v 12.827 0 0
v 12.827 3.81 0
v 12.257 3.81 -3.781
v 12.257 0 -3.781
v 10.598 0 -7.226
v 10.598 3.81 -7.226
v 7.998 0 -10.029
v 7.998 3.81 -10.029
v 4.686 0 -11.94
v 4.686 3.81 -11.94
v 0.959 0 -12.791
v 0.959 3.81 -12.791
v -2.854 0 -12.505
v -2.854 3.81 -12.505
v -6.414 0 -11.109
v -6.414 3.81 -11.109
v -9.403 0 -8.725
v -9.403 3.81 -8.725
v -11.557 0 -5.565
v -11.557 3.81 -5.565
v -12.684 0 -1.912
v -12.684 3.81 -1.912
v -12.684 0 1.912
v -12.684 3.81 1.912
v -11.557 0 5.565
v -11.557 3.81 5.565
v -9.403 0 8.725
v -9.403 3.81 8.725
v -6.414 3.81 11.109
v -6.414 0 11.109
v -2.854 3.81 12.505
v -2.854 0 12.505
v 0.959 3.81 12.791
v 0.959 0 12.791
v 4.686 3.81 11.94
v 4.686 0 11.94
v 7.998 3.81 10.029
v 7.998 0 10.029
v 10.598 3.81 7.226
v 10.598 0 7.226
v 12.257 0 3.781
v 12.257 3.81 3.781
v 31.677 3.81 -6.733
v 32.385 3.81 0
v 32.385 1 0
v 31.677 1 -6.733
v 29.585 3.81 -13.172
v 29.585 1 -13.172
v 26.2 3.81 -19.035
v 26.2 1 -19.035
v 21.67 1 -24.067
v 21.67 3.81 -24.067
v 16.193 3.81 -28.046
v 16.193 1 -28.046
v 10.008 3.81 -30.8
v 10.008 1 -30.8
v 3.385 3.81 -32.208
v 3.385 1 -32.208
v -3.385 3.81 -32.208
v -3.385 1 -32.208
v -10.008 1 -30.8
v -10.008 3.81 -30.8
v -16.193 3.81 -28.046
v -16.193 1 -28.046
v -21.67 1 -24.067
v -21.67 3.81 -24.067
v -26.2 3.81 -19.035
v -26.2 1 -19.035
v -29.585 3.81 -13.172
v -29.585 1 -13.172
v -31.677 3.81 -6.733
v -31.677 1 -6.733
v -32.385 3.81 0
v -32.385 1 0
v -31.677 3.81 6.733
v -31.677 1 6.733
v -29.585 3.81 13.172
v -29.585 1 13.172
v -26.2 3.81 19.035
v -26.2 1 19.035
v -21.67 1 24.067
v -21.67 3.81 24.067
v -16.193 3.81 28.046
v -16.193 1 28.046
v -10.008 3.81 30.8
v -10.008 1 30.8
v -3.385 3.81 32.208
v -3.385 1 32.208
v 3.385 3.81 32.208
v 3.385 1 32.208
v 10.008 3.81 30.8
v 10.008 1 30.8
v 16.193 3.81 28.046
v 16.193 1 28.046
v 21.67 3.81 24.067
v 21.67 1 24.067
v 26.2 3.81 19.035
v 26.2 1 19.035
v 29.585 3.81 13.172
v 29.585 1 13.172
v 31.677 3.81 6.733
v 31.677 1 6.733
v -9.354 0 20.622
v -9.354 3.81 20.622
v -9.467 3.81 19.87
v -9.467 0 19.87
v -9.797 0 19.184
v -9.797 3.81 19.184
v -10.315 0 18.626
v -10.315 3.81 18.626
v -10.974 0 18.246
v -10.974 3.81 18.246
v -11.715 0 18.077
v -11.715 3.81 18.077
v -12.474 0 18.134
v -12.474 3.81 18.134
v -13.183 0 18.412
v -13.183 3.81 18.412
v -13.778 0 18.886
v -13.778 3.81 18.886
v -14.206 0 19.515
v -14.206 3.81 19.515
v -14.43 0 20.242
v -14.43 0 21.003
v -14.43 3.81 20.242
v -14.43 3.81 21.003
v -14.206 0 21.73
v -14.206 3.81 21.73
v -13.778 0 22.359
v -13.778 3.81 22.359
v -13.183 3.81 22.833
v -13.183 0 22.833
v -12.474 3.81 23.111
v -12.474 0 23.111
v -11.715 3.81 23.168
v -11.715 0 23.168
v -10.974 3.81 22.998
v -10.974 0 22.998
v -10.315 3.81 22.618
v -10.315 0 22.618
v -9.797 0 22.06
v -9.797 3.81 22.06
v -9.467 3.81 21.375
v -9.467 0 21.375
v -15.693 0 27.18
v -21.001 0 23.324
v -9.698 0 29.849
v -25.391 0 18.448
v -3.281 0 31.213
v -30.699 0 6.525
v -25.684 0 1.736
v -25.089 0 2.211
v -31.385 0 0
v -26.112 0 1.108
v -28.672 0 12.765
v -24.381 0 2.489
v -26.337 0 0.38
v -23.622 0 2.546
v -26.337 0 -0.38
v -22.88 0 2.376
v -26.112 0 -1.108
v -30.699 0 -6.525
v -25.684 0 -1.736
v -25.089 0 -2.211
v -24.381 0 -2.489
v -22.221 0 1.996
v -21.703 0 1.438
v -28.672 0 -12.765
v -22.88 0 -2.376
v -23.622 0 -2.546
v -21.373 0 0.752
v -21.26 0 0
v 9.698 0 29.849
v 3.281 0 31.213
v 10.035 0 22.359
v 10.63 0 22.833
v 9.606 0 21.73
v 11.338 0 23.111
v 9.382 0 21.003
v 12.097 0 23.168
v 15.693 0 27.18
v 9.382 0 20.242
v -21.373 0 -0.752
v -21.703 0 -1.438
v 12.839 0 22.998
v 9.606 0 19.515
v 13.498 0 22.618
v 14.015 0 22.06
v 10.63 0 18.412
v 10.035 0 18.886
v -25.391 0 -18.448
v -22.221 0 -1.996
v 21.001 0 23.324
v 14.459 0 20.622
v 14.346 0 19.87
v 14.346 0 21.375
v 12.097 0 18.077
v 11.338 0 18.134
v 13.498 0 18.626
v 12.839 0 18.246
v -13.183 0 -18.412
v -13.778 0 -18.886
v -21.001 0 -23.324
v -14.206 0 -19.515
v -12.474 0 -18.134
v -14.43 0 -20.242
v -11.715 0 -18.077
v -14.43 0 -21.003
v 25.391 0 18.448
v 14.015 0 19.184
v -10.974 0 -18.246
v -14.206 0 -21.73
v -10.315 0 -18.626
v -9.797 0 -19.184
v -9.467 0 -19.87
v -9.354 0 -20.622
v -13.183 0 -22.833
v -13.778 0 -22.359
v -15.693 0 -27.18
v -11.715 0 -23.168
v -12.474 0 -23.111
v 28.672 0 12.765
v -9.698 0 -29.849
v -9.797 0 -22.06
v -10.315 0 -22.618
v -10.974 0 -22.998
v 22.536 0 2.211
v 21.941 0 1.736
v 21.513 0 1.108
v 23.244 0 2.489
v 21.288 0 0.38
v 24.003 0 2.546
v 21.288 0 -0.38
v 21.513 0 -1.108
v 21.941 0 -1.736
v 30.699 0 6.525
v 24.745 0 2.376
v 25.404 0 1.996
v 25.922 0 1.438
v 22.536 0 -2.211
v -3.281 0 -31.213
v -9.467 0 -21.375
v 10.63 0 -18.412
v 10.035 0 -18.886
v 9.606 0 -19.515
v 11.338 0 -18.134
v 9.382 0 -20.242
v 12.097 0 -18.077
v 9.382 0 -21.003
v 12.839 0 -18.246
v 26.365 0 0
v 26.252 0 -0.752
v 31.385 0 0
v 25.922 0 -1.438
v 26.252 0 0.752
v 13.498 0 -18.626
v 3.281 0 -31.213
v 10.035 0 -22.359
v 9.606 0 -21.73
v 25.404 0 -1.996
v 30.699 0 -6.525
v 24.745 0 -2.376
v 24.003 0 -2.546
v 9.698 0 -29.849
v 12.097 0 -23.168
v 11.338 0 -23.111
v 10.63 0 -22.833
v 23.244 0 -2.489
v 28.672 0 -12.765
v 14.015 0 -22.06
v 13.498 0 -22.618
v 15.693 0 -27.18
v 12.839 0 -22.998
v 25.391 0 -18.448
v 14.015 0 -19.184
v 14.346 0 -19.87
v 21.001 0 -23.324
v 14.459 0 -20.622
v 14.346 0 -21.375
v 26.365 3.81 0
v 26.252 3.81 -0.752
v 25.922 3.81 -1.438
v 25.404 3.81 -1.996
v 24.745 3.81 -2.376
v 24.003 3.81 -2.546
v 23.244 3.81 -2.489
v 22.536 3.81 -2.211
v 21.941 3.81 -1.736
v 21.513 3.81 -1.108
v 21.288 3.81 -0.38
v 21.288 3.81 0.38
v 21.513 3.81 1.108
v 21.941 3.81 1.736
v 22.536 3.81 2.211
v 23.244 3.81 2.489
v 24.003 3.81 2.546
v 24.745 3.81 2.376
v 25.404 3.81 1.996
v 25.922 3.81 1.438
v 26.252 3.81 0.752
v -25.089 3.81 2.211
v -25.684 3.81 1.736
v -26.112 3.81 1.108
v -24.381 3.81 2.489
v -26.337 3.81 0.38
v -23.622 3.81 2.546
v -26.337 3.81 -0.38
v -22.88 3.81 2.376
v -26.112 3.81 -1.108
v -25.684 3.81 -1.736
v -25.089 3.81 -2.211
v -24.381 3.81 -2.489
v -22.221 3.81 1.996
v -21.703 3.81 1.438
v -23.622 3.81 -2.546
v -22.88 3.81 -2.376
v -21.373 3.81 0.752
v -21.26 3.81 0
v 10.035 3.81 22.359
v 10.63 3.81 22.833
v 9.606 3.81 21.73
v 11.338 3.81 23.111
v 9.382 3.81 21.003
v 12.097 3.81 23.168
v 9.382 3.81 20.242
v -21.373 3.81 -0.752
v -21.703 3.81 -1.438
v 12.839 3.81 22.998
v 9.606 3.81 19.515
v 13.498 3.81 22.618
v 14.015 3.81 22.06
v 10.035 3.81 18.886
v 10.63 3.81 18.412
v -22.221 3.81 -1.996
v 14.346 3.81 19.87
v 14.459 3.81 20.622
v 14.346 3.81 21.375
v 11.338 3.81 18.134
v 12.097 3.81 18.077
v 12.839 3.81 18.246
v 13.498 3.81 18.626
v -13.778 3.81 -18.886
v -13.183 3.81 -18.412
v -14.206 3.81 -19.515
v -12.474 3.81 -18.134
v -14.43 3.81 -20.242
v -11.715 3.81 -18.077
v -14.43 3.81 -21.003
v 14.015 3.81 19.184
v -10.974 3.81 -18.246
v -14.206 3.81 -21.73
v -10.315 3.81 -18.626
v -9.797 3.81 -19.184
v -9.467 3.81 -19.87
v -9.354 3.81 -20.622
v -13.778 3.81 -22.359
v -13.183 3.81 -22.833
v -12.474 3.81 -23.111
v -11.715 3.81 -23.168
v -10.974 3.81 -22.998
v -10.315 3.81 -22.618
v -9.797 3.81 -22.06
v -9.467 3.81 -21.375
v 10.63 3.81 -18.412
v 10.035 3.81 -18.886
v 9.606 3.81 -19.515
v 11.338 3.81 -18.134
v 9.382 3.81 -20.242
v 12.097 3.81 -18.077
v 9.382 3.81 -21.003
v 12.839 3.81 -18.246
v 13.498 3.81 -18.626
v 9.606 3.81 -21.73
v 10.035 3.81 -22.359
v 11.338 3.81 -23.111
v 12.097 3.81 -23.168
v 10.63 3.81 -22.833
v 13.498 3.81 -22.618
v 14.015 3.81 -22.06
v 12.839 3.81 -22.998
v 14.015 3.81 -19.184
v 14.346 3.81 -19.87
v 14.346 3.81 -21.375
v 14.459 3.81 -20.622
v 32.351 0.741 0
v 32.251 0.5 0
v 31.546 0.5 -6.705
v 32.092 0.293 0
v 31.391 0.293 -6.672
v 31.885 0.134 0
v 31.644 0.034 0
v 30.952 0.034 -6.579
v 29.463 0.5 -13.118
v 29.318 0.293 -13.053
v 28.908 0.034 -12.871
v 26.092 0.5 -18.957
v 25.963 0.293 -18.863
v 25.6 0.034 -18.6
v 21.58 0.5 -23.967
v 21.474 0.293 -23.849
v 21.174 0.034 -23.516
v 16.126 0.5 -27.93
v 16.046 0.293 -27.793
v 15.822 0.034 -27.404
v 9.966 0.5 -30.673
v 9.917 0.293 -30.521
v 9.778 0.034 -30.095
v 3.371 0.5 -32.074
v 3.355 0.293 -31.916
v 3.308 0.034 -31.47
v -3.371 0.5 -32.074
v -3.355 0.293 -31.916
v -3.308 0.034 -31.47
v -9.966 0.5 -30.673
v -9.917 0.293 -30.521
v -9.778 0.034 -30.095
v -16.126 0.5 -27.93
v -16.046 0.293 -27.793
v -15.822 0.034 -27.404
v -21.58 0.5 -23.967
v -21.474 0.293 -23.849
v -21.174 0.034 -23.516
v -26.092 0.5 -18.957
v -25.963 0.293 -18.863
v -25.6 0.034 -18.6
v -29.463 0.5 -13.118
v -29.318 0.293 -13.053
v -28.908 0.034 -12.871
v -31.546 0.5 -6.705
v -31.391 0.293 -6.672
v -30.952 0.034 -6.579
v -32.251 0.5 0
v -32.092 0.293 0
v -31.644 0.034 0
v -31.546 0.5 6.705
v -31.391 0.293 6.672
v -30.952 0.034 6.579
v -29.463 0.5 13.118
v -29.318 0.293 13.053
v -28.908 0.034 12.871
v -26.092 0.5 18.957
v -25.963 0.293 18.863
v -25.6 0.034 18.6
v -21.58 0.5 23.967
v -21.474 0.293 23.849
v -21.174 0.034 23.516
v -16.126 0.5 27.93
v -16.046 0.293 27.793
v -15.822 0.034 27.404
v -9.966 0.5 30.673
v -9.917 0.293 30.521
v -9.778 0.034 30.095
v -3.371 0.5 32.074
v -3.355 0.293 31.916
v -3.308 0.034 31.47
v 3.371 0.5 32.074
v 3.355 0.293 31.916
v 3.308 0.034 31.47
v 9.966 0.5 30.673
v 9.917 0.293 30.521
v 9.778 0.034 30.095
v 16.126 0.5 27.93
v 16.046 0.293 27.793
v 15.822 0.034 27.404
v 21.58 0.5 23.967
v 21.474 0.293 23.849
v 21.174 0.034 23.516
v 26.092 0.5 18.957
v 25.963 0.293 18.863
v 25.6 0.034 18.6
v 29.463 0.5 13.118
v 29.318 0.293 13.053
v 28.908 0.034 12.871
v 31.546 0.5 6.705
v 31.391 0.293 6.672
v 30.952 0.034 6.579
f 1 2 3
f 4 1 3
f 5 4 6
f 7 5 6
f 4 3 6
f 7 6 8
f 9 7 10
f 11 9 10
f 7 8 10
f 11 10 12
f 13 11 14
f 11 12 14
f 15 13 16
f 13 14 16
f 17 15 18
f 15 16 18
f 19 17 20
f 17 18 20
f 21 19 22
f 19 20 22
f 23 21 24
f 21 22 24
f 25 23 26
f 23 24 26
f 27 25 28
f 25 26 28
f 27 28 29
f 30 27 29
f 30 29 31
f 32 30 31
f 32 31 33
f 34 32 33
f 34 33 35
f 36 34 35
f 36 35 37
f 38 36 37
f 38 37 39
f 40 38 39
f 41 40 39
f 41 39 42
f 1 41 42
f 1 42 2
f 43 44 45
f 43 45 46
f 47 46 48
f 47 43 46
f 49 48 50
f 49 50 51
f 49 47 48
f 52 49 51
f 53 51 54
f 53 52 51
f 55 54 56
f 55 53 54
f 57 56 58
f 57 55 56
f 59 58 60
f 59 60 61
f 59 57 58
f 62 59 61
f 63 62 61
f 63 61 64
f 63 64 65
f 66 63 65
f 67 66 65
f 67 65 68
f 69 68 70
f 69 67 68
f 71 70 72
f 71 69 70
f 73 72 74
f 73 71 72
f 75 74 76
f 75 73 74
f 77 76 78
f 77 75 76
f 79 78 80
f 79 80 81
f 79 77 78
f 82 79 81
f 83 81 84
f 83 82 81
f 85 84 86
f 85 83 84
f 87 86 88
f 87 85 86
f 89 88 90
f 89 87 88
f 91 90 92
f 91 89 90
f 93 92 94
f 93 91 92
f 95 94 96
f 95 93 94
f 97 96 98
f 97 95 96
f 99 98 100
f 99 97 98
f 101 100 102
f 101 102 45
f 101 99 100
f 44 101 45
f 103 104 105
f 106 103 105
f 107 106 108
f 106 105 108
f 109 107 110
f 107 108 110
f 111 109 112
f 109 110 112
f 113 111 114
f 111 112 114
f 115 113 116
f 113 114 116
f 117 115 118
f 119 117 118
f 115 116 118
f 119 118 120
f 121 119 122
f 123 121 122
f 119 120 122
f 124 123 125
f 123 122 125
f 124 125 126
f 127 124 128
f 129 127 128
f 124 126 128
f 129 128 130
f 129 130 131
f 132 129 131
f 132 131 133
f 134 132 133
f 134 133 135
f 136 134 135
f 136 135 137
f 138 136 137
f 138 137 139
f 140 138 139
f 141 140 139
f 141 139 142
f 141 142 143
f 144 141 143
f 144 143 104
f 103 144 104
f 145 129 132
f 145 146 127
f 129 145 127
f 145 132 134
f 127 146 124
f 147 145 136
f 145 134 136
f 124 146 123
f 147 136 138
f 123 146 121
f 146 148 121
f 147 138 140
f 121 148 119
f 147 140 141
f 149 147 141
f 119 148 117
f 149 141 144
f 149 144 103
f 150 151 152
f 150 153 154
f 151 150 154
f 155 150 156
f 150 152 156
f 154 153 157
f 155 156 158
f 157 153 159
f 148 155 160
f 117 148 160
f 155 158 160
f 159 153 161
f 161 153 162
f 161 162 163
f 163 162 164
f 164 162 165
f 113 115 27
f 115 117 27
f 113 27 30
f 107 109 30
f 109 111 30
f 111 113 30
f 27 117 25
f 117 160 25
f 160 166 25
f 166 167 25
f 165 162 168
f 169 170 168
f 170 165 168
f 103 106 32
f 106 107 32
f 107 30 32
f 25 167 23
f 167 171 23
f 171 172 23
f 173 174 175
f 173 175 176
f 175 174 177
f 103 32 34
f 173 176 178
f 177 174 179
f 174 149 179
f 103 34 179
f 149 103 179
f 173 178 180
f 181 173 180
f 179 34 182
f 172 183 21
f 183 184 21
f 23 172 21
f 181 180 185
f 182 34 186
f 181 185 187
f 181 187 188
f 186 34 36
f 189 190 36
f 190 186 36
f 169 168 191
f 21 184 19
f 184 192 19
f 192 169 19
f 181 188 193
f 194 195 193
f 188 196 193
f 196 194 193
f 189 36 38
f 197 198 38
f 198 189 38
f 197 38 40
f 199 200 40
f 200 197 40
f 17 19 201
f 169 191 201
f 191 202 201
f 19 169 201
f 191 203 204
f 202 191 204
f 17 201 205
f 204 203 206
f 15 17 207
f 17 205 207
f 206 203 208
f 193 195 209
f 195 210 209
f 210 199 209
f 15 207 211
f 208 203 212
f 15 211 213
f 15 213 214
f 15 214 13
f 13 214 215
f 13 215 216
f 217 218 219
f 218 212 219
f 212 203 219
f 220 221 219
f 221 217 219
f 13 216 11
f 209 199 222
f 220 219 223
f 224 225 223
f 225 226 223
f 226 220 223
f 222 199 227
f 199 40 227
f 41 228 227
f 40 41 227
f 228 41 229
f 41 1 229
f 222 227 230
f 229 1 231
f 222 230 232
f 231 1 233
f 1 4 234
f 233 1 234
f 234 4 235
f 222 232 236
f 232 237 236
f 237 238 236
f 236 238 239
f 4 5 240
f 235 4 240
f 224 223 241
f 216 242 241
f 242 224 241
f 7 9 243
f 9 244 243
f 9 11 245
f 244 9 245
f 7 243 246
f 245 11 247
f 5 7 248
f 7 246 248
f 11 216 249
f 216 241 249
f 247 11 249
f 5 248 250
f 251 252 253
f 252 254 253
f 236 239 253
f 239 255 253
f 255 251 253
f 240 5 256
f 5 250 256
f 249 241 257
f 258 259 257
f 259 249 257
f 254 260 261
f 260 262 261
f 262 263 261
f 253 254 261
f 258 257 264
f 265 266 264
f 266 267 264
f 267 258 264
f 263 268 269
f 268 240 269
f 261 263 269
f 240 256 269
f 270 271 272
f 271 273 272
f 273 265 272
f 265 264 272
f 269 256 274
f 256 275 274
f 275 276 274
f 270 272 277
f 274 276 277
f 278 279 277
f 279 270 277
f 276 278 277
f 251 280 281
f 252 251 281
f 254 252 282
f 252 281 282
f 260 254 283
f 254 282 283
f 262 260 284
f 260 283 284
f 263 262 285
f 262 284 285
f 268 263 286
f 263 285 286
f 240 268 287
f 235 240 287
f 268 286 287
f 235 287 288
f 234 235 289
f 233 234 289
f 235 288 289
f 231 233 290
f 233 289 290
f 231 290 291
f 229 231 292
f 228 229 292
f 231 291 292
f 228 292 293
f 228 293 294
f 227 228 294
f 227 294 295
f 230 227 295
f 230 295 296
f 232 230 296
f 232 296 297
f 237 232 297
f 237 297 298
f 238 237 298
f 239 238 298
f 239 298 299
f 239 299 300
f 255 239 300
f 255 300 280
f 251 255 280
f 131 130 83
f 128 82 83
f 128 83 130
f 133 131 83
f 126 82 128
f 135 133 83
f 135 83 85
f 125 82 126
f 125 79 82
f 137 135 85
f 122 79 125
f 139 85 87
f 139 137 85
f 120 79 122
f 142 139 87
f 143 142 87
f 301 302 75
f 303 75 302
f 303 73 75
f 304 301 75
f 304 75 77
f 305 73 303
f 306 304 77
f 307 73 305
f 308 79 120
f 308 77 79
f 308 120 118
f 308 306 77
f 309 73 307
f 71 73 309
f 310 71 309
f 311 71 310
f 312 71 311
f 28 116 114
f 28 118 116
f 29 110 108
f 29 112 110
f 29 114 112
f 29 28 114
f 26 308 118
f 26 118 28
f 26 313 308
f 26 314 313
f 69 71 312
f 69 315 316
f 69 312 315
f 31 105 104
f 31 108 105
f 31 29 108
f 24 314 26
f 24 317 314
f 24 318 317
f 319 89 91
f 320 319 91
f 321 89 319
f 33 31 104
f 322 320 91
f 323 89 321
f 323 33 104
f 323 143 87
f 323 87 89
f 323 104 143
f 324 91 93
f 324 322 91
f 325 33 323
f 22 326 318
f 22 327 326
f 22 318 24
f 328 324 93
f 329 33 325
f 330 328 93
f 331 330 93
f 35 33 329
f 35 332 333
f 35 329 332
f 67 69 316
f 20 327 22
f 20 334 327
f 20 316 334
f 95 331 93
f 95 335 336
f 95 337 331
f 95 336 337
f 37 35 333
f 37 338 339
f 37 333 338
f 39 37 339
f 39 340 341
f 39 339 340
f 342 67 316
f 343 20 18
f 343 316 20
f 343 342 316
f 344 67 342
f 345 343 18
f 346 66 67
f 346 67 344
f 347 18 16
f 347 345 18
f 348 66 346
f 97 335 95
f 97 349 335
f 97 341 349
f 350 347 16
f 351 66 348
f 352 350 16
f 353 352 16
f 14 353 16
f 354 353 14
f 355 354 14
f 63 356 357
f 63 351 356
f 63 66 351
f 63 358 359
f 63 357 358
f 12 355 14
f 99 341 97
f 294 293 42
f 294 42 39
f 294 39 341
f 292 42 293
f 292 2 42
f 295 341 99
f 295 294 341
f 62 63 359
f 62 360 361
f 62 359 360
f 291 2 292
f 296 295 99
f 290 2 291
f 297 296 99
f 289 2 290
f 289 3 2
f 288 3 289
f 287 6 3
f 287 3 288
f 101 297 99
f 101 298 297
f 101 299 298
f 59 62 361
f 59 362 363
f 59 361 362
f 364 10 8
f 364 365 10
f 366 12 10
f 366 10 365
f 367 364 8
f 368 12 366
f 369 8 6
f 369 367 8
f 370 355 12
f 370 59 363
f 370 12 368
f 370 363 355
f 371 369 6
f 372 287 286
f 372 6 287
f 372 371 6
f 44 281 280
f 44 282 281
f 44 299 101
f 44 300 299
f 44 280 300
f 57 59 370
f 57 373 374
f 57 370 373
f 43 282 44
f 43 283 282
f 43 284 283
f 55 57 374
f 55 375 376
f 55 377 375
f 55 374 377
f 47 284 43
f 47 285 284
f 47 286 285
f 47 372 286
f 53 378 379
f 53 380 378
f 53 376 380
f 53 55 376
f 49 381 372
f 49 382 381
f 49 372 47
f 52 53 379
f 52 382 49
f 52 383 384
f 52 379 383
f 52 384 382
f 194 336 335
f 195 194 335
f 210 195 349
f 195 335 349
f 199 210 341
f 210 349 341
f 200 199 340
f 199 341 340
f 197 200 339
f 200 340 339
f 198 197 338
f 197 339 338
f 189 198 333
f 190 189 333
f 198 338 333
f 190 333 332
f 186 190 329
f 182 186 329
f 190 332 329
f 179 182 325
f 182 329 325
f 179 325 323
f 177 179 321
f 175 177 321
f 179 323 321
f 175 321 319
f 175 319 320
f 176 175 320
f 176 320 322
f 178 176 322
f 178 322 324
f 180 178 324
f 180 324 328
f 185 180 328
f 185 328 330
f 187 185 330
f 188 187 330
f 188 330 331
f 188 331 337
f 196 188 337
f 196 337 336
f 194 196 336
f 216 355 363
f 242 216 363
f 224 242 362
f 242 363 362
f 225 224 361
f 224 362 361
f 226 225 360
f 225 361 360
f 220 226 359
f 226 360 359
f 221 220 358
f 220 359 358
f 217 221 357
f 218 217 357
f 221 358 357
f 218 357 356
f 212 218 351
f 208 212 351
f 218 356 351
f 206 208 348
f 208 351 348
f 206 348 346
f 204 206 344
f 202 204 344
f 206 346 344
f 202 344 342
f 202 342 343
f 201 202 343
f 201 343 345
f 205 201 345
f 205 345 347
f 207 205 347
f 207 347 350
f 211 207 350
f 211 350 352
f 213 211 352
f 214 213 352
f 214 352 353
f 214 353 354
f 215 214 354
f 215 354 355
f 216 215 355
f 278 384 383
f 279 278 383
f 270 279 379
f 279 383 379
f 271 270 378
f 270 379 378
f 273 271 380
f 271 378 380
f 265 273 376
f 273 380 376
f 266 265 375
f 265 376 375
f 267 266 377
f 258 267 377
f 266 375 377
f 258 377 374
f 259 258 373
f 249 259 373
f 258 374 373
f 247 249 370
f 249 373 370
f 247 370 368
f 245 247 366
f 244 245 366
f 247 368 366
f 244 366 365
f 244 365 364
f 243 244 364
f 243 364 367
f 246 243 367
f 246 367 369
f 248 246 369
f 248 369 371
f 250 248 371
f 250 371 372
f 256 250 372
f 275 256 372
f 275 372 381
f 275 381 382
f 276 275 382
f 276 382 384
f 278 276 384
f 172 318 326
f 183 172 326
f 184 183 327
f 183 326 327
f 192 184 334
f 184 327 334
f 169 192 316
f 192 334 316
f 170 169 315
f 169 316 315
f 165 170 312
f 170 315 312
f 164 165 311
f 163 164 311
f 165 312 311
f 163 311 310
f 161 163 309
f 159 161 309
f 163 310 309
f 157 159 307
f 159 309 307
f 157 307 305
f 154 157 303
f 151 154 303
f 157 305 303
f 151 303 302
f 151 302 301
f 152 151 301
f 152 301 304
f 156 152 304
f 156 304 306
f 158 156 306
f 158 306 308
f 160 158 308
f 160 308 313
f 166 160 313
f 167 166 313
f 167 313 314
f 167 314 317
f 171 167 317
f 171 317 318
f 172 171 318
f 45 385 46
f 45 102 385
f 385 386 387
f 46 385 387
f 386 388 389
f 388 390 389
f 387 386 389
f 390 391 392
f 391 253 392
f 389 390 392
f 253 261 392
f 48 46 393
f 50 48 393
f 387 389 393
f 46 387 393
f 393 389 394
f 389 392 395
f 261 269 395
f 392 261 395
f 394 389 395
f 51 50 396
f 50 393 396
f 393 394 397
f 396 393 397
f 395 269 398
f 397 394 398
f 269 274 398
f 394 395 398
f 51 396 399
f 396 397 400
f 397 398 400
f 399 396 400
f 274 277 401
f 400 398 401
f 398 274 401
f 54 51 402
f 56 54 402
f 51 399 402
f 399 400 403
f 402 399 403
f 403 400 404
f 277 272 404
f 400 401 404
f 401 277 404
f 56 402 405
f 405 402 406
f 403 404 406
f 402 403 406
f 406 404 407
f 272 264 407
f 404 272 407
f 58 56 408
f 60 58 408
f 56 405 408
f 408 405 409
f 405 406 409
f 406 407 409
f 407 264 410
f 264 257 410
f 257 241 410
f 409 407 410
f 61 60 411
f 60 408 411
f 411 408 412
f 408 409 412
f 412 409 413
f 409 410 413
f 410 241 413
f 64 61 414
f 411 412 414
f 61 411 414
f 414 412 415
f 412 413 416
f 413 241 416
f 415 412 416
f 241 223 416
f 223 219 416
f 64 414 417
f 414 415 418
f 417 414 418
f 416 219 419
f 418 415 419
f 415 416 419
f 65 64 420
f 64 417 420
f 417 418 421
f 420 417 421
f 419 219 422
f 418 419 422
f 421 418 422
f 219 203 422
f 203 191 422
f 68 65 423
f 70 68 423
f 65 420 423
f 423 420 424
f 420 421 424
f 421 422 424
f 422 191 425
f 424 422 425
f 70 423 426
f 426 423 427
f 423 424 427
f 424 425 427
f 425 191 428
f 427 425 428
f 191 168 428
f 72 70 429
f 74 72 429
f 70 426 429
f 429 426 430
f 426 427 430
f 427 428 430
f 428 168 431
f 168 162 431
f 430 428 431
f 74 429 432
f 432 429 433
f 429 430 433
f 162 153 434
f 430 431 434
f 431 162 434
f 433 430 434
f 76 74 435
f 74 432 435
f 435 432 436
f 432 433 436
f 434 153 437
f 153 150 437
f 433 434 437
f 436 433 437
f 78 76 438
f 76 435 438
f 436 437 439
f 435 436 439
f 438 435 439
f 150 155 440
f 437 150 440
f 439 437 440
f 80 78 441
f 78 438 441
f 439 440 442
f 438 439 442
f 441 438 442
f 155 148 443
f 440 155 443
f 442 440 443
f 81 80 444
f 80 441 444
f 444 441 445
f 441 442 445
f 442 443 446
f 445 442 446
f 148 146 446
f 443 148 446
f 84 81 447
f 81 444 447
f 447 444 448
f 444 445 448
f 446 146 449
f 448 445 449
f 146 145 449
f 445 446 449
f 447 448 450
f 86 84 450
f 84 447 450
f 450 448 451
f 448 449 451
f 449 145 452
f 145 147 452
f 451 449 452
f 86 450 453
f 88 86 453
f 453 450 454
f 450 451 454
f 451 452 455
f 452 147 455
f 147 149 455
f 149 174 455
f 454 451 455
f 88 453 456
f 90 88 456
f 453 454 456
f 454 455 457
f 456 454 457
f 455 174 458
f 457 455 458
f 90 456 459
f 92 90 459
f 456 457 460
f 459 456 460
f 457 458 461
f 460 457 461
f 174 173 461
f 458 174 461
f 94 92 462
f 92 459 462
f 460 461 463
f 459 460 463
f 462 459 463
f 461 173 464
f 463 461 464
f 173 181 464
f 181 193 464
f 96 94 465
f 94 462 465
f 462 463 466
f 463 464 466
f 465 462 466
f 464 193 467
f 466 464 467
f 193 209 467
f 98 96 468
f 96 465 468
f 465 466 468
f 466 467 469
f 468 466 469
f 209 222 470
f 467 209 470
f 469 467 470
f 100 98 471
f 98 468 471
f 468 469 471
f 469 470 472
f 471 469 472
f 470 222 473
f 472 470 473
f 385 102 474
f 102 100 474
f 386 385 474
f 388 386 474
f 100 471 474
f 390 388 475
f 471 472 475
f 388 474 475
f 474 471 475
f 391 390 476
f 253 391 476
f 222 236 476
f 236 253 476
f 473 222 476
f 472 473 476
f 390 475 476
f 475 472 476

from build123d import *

# Parameters (mm, degrees)
SKETCH1_W                      = 32.385
SKETCH1_H                      = 3.81
F_7_0_201_DIAMETER_HOLE1_D     = 5.1054
F_7_0_201_DIAMETER_HOLE1_DEPTH = 3.81
HOLE1_D                        = 25.654
HOLE1_DEPTH                    = 3.81
FILLET1_R                      = 1


with BuildPart() as part:
    # Sketch1 → Revolve1 (revolve)
    with BuildSketch(Plane(origin=(0, 0, 0), x_dir=(-1, 0, 0), z_dir=(0, 0, -1))):
        with Locations((-16.1925, 1.905)):
            Rectangle(SKETCH1_W, SKETCH1_H)
    revolve(axis=Axis((0, 0, 0), (0, 1, 0)))

    # #7 (0.201) Diameter Hole1
    with Locations(Plane(origin=(0, 0, 0), x_dir=(-1, 0, 0), z_dir=(0, -1, 0))):
        with Locations((11.90625, 20.622229928), (-11.90625, 20.622229928), (-23.8125, 0), (-11.90625, -20.622229928), (11.90625, -20.622229928), (23.8125, 0)):
            Hole(F_7_0_201_DIAMETER_HOLE1_D / 2, depth=F_7_0_201_DIAMETER_HOLE1_DEPTH)

    # Hole1
    with Locations(Plane(origin=(0, 0, 0), x_dir=(-1, 0, 0), z_dir=(0, -1, 0))):
        with Locations((0, 0)):
            Hole(HOLE1_D / 2, depth=HOLE1_DEPTH)

    # Fillet1
    fillet1_edges = [part.edges().sort_by_distance(p)[0] for p in [
        (-32.385, 0, 0),
    ]]
    fillet(fillet1_edges, radius=FILLET1_R)


solid = part.part
